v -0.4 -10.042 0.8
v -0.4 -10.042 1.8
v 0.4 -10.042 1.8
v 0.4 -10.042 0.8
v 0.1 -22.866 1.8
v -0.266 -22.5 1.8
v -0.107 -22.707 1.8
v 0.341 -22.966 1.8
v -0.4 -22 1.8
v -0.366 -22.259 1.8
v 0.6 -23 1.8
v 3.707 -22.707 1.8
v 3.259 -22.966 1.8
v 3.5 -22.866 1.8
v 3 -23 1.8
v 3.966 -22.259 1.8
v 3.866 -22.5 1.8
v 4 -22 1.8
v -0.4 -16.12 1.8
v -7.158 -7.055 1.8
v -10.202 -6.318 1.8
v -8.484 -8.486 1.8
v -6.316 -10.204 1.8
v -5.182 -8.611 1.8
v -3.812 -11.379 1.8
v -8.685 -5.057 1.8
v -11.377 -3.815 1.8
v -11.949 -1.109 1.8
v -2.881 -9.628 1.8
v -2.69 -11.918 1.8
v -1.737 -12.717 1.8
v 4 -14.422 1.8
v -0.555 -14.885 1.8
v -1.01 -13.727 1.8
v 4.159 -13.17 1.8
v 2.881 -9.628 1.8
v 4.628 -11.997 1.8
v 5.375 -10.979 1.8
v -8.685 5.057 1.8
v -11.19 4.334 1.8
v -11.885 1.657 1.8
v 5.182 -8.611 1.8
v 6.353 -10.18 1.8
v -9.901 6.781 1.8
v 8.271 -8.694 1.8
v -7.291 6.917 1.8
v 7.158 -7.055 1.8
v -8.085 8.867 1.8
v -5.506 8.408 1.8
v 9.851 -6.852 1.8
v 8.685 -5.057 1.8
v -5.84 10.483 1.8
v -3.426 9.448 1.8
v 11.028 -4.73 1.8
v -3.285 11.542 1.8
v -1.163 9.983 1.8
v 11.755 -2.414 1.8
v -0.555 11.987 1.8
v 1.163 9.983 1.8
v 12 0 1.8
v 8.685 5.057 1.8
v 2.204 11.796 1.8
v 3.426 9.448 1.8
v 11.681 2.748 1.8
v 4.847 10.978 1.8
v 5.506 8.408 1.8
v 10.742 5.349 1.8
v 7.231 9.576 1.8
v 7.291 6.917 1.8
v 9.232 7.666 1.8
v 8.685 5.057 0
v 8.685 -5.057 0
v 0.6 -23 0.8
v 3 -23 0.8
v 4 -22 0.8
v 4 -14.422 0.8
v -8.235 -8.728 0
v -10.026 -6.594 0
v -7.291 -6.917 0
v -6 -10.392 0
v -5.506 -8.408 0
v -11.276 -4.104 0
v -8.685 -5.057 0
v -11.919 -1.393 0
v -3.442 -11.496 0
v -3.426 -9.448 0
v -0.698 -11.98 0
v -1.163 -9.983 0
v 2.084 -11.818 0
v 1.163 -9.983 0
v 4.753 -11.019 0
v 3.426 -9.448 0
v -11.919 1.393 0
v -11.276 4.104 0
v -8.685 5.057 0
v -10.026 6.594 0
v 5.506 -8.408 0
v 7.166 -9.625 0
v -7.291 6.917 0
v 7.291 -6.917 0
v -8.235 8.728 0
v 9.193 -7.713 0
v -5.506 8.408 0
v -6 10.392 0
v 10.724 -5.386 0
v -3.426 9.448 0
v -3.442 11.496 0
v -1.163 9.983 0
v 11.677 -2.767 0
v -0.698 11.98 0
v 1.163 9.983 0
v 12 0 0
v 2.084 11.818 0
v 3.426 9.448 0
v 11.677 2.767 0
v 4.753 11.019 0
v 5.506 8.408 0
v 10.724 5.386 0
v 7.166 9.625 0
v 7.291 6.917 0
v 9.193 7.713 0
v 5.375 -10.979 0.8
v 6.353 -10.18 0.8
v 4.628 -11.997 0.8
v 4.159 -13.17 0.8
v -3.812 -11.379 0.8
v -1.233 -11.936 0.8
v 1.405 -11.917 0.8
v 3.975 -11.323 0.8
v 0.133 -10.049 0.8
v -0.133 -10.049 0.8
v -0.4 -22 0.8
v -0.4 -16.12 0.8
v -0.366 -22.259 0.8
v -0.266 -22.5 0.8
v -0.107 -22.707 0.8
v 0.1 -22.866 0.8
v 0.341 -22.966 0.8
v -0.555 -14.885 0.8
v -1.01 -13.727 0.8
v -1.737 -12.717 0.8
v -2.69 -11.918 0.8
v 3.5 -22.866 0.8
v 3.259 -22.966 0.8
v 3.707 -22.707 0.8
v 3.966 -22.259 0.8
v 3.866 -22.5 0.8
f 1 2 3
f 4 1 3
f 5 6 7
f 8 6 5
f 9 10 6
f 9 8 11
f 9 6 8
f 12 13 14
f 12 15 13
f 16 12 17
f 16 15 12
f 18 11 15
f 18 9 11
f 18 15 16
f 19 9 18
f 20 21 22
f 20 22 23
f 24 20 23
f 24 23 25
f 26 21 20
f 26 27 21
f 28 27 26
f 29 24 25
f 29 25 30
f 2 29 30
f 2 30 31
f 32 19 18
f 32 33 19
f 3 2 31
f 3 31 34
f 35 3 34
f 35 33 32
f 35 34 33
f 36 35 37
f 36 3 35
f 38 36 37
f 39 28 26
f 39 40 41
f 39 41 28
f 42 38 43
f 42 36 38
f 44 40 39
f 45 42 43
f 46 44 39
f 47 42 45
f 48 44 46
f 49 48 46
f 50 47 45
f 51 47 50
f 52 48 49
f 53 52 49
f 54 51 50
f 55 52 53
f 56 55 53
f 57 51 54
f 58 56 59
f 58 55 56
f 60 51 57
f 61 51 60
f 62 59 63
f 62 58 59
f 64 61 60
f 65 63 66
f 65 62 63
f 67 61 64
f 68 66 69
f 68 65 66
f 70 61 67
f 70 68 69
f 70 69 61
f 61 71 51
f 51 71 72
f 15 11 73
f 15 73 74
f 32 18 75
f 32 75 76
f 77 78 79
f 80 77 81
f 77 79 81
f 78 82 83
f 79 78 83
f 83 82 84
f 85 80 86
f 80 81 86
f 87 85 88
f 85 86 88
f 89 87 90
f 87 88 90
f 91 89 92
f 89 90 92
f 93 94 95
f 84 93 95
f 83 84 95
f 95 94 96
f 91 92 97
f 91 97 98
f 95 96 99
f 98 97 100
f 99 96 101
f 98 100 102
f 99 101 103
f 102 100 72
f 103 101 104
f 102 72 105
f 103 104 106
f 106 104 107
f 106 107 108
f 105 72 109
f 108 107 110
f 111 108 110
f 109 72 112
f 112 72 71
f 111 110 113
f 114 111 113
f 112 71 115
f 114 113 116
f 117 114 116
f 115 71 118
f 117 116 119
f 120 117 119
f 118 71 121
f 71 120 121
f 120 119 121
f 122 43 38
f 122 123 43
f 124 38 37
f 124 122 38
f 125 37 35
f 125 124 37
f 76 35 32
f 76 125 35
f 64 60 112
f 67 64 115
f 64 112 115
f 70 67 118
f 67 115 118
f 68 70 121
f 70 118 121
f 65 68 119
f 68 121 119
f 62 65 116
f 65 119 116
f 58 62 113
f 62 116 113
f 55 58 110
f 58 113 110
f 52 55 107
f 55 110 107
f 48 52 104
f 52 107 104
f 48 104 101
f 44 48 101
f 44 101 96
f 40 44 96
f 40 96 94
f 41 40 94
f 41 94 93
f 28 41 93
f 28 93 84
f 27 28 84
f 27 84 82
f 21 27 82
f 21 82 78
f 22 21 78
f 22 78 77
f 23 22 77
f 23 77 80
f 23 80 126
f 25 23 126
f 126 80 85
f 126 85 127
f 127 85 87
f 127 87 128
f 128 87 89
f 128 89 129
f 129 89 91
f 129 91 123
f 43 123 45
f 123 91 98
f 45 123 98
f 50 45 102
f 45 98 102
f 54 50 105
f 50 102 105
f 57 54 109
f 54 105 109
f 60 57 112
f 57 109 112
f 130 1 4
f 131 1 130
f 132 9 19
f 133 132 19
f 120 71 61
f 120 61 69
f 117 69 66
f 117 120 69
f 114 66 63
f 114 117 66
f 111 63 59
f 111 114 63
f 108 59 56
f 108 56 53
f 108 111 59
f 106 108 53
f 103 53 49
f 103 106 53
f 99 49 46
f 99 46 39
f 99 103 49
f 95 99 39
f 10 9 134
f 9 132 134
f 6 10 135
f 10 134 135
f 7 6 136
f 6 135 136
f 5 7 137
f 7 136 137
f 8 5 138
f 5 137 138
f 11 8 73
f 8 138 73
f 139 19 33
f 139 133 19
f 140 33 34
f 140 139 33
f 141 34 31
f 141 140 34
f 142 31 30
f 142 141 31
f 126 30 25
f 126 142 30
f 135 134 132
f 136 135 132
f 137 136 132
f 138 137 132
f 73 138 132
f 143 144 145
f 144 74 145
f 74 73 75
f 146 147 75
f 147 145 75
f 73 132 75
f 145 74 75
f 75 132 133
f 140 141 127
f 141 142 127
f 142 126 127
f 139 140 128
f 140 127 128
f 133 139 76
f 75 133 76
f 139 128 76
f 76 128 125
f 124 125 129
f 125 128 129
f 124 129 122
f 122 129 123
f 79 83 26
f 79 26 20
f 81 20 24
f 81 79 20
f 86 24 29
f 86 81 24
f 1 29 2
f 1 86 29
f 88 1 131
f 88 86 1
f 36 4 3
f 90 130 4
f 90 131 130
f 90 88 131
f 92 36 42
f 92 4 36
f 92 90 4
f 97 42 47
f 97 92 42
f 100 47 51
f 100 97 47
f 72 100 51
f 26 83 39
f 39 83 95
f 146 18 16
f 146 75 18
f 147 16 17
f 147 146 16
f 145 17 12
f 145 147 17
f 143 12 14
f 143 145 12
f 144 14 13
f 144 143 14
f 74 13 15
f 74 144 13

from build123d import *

# Parameters (mm, degrees)
SKIZZE1_R                       = 12
SKIZZE1_R_2                     = 10.05
AUFSATZ_LINEAR_AUSTRAGEN1_DEPTH = 1.8
SKIZZE2_W                       = 4.4
SKIZZE2_H                       = 12.957963354
AUFSATZ_LINEAR_AUSTRAGEN2_DEPTH = 1
VERRUNDUNG1_R                   = 5
VERRUNDUNG2_R                   = 1
AUFSATZ_LINEAR_AUSTRAGEN3_DEPTH = 1.8


with BuildPart() as part:
    # Skizze1 → Aufsatz-Linear austragen1 (new body)
    with BuildSketch(Plane.XY):
        Circle(SKIZZE1_R)
        Circle(SKIZZE1_R_2, mode=Mode.SUBTRACT)
    extrude(amount=AUFSATZ_LINEAR_AUSTRAGEN1_DEPTH)

    # Skizze2 → Aufsatz-Linear austragen2 (add)
    with BuildSketch(Plane.XY.offset(1.8)):
        with Locations((1.8, -16.521018323)):
            Rectangle(SKIZZE2_W, SKIZZE2_H)
    extrude(amount=-AUFSATZ_LINEAR_AUSTRAGEN2_DEPTH)

    # Verrundung1
    verrundung1_edges = [part.edges().sort_by_distance(p)[0] for p in [
        (-0.4, -11.99333148, 1.3),
        (4, -11.313708499, 1.3),
    ]]
    fillet(verrundung1_edges, radius=VERRUNDUNG1_R)

    # Verrundung2
    verrundung2_edges = [part.edges().sort_by_distance(p)[0] for p in [
        (-0.4, -23, 1.3),
        (4, -23, 1.3),
    ]]
    fillet(verrundung2_edges, radius=VERRUNDUNG2_R)

    # Skizze1<3> → Aufsatz-Linear austragen3 (add)
    with BuildSketch(Plane.XY):
        with BuildLine():
            Line((-8.685254038, -5.056566256), (-8.685254038, 5.056566256))
            ThreePointArc((-8.685254038, 5.056566256), (-10.05, 0), (-8.685254038, -5.056566256))
        make_face()
        with BuildLine():
            ThreePointArc((10.05, 0), (9.702816681, 2.618749408), (8.685254038, 5.056566256))
            Line((8.685254038, 5.056566256), (8.685254038, -5.056566256))
            ThreePointArc((8.685254038, -5.056566256), (9.702816681, -2.618749408), (10.05, 0))
        make_face()
    extrude(amount=AUFSATZ_LINEAR_AUSTRAGEN3_DEPTH)


solid = part.part
